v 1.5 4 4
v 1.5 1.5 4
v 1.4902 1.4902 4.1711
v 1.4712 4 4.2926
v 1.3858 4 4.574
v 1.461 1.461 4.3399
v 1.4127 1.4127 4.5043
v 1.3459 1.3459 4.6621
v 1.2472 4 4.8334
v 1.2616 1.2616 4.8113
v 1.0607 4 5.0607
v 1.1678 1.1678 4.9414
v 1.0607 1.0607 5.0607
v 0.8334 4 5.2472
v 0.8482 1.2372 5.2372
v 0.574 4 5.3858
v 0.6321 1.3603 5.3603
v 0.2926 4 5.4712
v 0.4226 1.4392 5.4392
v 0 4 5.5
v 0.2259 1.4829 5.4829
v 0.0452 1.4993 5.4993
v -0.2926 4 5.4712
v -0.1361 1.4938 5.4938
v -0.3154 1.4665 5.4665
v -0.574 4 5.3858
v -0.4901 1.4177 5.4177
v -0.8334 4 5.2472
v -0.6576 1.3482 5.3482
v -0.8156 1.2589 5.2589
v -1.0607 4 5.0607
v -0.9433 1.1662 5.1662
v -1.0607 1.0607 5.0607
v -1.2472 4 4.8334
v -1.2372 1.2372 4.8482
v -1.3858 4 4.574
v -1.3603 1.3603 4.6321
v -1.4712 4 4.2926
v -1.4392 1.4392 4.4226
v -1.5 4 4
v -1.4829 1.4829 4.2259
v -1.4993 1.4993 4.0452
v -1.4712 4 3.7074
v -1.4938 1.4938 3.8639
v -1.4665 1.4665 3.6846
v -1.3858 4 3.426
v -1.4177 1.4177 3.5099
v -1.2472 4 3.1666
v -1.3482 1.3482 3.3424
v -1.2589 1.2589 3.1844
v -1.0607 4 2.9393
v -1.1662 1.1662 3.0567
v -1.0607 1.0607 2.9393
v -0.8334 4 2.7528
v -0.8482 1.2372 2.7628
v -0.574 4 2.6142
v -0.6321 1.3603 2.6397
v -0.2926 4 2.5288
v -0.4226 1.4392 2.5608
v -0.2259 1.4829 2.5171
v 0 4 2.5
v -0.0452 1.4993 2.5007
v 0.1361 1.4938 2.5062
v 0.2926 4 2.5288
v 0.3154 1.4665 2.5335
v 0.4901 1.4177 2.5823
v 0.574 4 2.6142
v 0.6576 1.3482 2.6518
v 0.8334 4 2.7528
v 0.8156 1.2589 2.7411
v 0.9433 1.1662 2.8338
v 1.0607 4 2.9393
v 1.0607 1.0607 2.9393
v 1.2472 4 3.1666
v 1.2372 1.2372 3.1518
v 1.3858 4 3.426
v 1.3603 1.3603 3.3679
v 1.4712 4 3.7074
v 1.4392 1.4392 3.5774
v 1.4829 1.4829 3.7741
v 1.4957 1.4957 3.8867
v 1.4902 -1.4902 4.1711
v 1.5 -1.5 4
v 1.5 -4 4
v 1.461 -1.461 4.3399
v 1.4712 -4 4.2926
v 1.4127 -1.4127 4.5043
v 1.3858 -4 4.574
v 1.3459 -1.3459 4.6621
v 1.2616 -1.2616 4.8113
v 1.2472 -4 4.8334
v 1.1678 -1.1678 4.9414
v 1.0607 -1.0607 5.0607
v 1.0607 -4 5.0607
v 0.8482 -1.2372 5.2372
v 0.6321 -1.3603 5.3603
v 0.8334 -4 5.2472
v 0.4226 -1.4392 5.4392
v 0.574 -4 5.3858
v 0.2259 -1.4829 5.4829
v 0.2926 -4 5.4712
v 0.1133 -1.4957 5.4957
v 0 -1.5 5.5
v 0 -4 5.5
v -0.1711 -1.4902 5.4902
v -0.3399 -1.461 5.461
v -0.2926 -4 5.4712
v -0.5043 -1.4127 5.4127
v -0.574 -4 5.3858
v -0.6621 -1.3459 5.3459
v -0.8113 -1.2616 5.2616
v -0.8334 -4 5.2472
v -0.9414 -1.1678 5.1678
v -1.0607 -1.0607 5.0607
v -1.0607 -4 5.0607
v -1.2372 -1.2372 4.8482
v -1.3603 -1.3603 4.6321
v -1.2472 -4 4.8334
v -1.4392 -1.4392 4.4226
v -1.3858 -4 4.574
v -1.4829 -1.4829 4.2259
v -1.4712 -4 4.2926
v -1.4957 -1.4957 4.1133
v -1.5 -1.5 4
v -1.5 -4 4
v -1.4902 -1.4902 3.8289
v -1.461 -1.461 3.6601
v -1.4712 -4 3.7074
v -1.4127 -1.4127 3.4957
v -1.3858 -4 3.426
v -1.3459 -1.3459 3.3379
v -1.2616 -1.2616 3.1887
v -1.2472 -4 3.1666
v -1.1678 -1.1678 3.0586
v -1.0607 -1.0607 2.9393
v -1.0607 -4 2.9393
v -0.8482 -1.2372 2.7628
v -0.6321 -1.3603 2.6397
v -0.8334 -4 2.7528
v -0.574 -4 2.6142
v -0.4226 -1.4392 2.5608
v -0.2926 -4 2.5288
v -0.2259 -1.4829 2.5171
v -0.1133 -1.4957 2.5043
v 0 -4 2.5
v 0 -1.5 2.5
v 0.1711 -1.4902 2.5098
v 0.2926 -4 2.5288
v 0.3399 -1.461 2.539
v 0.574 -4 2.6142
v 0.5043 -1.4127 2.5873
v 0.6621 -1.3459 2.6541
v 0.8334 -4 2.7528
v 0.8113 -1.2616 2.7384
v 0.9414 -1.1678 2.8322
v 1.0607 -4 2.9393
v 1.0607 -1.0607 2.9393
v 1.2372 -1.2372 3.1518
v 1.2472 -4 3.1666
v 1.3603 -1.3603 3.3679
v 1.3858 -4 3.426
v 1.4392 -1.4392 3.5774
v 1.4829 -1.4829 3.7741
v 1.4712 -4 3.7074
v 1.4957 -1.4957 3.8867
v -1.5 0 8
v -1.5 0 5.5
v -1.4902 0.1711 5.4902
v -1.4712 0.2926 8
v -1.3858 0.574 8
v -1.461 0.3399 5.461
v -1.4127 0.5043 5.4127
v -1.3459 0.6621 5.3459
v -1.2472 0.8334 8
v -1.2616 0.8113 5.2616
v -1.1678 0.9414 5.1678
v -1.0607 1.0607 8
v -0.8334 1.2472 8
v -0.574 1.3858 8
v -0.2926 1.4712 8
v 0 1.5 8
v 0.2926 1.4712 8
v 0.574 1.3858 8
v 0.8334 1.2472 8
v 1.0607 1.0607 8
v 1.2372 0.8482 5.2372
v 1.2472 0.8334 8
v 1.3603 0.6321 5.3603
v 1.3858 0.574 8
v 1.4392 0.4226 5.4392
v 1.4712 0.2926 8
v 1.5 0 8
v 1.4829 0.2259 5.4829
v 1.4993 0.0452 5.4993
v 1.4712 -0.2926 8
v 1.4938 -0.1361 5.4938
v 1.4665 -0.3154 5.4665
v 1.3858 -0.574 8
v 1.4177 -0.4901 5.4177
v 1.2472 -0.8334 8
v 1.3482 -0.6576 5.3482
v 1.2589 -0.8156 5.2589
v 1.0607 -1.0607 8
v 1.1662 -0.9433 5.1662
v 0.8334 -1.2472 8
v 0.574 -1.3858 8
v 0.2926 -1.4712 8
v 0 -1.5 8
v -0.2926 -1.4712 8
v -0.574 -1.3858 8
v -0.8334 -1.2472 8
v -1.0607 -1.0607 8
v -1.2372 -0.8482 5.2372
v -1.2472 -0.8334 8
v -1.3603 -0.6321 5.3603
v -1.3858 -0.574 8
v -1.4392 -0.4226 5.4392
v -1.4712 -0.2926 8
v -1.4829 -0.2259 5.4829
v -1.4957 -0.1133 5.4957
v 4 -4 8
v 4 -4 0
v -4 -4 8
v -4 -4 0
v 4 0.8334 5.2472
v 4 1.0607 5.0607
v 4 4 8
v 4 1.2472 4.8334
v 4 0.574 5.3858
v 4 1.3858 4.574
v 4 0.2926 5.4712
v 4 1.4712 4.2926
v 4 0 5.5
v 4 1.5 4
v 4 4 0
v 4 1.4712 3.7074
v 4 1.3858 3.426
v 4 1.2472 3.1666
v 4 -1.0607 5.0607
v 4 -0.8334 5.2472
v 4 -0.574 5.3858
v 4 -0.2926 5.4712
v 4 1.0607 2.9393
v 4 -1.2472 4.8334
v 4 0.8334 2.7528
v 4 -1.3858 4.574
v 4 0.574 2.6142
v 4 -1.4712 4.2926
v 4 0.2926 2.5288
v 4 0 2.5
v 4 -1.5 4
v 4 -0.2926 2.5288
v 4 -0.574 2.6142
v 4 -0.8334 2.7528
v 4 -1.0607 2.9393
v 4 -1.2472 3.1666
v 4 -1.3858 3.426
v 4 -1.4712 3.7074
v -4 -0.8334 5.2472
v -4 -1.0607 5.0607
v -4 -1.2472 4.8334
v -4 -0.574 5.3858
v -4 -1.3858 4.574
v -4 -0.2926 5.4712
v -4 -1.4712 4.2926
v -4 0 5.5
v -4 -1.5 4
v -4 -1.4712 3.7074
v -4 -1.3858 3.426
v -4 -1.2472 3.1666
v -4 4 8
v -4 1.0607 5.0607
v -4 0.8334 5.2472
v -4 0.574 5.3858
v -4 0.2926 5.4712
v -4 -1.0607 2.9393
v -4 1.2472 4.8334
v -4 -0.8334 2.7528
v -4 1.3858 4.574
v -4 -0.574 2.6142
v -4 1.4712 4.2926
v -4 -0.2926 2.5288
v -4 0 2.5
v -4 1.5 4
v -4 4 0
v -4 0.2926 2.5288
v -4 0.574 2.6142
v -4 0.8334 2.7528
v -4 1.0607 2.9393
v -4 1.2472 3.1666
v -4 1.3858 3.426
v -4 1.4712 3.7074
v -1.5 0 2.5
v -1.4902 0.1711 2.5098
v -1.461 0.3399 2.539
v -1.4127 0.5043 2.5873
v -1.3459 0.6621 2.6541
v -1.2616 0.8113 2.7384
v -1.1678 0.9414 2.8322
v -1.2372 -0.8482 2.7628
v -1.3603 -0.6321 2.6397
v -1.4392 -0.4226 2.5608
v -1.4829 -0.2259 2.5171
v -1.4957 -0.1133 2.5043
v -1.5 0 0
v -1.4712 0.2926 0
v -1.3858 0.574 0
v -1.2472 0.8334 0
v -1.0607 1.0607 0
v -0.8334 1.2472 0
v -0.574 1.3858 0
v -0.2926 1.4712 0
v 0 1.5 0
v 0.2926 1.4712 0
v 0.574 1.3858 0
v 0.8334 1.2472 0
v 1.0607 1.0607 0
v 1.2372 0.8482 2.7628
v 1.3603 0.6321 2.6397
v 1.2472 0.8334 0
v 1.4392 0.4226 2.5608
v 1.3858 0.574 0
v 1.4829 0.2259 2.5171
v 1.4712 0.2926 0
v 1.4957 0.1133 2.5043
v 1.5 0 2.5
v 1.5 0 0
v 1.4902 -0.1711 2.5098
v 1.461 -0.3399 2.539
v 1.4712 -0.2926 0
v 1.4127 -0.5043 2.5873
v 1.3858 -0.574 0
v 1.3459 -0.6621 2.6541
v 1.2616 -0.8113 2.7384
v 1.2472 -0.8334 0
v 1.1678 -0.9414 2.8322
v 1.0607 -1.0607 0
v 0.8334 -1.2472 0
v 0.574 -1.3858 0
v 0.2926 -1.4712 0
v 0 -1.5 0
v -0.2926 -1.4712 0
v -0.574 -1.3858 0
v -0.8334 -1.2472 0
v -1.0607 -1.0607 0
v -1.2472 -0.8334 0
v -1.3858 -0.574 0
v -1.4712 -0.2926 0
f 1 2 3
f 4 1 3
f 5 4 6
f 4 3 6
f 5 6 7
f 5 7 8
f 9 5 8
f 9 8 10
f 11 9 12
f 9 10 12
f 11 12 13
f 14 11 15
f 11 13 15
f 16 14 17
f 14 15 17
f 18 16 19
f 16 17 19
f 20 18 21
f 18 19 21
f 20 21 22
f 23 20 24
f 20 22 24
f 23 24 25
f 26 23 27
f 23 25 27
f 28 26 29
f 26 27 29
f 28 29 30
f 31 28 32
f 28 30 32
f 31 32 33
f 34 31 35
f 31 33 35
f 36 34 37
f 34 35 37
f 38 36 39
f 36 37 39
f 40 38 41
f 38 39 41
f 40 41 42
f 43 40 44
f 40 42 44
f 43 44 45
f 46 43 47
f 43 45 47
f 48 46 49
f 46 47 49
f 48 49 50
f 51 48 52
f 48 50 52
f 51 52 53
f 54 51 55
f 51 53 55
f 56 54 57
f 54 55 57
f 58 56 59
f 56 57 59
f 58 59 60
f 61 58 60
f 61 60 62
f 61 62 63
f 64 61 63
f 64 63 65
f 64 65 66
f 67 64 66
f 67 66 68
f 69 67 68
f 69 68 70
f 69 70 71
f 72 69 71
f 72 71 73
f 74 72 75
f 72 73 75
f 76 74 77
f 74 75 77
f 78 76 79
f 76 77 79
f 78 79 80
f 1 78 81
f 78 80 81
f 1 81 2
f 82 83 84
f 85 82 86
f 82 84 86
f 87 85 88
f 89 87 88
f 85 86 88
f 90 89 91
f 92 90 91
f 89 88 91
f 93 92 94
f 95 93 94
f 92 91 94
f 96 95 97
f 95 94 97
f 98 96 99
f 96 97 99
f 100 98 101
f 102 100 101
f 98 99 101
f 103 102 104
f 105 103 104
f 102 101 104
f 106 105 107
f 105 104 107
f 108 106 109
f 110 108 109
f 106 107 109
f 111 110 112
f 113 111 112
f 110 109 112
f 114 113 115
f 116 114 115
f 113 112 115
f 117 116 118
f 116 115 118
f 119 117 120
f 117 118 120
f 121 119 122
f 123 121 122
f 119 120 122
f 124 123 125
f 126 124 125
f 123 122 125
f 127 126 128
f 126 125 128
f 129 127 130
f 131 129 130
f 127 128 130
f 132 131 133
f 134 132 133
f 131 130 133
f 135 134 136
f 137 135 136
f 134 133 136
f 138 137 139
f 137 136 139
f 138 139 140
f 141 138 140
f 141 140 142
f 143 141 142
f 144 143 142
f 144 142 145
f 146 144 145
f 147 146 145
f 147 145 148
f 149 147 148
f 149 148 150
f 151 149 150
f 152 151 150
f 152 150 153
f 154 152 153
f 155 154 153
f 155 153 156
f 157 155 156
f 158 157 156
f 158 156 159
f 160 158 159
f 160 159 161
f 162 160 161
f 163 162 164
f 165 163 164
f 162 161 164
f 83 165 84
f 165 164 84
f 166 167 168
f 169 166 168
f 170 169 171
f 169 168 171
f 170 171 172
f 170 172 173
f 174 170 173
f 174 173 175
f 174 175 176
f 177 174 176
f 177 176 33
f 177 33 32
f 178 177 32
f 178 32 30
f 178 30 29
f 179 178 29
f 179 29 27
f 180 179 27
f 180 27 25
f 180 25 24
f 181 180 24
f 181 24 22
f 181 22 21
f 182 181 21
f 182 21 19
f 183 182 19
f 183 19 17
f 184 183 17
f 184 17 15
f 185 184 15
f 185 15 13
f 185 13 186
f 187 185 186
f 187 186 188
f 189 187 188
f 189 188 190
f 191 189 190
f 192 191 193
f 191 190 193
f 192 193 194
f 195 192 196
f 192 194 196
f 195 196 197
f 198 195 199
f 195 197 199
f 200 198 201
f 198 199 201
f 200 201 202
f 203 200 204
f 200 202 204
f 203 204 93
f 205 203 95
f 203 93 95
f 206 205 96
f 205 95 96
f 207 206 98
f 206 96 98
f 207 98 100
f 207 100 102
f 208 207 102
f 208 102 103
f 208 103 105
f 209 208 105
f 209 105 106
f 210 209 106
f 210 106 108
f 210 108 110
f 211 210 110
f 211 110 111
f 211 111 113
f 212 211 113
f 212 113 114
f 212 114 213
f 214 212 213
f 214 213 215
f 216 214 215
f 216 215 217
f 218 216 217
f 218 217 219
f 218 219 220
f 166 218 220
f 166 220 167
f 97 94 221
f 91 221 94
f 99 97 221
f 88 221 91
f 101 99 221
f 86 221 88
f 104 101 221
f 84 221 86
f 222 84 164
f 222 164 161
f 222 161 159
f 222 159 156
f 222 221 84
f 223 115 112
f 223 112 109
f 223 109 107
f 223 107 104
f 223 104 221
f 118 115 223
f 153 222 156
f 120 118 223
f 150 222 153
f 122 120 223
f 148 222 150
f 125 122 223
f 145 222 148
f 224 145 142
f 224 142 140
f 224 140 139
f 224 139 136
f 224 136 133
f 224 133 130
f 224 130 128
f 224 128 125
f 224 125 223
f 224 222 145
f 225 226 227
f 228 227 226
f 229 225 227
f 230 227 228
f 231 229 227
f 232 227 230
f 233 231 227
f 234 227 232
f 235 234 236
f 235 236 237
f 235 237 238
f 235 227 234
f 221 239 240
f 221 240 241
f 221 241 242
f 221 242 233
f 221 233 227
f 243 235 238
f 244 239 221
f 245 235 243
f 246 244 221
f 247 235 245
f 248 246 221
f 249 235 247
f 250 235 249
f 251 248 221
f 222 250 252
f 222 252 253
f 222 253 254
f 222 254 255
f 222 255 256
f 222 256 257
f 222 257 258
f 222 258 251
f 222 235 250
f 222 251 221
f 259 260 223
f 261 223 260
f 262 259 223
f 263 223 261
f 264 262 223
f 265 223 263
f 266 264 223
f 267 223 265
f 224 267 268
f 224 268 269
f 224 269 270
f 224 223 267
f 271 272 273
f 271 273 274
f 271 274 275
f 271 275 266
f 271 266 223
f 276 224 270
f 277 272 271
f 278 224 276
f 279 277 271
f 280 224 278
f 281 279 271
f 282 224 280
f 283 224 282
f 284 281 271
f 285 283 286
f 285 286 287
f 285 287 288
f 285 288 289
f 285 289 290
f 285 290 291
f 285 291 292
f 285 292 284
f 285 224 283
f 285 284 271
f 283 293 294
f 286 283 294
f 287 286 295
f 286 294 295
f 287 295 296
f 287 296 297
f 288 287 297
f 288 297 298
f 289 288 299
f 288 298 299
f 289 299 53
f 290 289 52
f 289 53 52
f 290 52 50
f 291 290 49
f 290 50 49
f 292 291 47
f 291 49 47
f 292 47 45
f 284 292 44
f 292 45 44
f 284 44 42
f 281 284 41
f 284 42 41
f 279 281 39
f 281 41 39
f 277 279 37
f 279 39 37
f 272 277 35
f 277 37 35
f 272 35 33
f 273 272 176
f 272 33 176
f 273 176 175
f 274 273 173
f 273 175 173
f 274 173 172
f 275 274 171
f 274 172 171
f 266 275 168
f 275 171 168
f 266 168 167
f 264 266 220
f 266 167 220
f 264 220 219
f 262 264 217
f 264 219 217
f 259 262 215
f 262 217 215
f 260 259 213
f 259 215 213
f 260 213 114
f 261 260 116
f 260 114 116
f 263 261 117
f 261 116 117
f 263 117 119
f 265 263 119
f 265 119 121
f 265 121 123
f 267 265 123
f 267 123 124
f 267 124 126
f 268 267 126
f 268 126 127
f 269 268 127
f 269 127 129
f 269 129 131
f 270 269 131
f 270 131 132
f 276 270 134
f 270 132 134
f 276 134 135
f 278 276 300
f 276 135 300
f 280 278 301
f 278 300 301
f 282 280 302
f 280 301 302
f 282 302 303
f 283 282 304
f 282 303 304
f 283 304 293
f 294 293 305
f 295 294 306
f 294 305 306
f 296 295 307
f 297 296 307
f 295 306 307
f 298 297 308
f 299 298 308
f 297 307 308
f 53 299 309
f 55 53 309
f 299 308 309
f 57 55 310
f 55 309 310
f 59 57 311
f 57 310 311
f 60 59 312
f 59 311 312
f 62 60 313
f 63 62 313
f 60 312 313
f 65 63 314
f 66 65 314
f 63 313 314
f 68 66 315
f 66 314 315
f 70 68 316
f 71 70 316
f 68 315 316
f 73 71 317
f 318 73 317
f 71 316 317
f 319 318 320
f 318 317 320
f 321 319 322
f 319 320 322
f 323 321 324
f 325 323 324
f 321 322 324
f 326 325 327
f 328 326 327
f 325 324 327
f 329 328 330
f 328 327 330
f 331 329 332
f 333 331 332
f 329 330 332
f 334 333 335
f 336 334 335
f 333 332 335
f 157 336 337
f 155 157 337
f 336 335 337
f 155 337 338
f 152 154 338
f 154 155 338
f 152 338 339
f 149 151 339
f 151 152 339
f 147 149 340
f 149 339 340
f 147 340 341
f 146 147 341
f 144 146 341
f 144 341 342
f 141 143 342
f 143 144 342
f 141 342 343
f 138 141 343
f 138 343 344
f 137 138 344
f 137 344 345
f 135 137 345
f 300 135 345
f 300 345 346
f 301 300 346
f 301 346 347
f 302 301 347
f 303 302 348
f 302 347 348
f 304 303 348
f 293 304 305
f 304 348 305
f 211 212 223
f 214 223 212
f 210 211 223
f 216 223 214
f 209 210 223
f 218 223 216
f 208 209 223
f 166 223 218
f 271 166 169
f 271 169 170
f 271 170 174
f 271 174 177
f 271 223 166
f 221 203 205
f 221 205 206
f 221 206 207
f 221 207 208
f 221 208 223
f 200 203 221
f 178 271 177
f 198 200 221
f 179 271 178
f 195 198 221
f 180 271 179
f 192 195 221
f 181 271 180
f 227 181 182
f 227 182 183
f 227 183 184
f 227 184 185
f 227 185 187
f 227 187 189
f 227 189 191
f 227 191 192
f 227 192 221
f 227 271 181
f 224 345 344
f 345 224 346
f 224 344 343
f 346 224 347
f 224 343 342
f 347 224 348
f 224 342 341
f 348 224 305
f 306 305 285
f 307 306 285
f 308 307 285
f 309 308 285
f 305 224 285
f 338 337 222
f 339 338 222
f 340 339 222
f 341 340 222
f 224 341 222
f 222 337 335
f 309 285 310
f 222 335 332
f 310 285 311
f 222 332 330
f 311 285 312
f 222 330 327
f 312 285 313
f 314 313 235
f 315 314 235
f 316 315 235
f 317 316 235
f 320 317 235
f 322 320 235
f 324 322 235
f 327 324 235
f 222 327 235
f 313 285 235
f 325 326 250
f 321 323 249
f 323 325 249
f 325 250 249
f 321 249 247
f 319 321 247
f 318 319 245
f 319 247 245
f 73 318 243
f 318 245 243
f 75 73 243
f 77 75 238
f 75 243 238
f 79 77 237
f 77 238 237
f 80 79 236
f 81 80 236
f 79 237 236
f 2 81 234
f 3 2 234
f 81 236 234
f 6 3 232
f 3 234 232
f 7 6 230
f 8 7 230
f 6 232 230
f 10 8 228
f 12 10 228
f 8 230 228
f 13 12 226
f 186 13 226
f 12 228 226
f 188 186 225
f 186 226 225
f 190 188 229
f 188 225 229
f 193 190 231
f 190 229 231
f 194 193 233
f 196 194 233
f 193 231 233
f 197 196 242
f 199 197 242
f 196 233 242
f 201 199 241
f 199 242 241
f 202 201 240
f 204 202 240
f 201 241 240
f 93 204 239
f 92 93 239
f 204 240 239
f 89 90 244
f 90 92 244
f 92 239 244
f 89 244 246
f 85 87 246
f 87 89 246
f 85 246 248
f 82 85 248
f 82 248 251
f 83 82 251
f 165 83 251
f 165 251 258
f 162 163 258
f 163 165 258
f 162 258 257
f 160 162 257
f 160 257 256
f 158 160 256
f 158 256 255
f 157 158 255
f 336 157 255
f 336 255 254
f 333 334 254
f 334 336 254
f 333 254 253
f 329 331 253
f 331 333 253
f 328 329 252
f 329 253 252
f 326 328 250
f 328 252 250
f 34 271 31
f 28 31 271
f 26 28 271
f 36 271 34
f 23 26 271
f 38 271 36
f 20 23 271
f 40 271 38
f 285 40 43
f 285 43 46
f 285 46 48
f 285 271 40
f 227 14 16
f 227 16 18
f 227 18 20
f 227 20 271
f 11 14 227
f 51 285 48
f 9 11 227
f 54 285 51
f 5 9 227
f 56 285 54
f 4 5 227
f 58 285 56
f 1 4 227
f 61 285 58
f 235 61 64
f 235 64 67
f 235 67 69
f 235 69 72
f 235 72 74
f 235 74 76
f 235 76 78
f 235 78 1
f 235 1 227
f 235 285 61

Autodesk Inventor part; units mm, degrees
ref_plane "YZ Plane" through (0, 0, 0) normal (1, 0, 0) x (0, 1, 0)
ref_plane "XZ Plane" through (0, 0, 0) normal (0, 1, 0) x (-1, 0, 0)
ref_plane "XY Plane" through (0, 0, 0) normal (0, 0, 1) x (1, 0, 0)
sketch "草图1" plane through (0, 0, 0) normal (0, 0, 1) x (1, 0, 0)
  line L0 (4, -4) -> (-4, -4)
  line L1 (-4, -4) -> (-4, 4)
  line L2 (-4, 4) -> (4, 4)
  line L3 (4, 4) -> (4, -4)
  line L4 (4, -4) -> (-4, 4) construction
  line L5 (-4, -4) -> (4, 4) construction
  point P0 (0, 0)
  dimension "d0" = 8
  dimension "d1" = 8
extrude "拉伸1" add sketch "草图1" along normal blind 8
sketch "草图2" plane through (-4, -4, 0) normal (0, -1, 0) x (1, 0, 0)
  line L0 (8, 8) -> (0, 8) projected
  line L1 (0, 8) -> (8, 0)
  circle A0 centre (4, 4) radius 1.5
  point P0 (4, 0)
  dimension "d4" = 3
extrude "拉伸2" cut sketch "草图2" against normal blind 8
sketch "草图3" plane through (0, 0, 0) normal (0, 0, -1) x (-1, 0, 0)
  circle A0 centre (0, 0) radius 1.5
  dimension "d7" = 3
extrude "拉伸3" cut sketch "草图3" against normal blind 8
sketch "草图4" plane through (4, -4, 0) normal (1, 0, 0) x (0, 0, -1)
  line L0 (0, 8) -> (0, 0) projected
  line L1 (0, 8) -> (-8, 0)
  circle A0 centre (-4, 4) radius 1.5
  point P0 (0, 4)
  dimension "d10" = 3
extrude "拉伸4" cut sketch "草图4" against normal blind 14.25
properties part number "8X"
